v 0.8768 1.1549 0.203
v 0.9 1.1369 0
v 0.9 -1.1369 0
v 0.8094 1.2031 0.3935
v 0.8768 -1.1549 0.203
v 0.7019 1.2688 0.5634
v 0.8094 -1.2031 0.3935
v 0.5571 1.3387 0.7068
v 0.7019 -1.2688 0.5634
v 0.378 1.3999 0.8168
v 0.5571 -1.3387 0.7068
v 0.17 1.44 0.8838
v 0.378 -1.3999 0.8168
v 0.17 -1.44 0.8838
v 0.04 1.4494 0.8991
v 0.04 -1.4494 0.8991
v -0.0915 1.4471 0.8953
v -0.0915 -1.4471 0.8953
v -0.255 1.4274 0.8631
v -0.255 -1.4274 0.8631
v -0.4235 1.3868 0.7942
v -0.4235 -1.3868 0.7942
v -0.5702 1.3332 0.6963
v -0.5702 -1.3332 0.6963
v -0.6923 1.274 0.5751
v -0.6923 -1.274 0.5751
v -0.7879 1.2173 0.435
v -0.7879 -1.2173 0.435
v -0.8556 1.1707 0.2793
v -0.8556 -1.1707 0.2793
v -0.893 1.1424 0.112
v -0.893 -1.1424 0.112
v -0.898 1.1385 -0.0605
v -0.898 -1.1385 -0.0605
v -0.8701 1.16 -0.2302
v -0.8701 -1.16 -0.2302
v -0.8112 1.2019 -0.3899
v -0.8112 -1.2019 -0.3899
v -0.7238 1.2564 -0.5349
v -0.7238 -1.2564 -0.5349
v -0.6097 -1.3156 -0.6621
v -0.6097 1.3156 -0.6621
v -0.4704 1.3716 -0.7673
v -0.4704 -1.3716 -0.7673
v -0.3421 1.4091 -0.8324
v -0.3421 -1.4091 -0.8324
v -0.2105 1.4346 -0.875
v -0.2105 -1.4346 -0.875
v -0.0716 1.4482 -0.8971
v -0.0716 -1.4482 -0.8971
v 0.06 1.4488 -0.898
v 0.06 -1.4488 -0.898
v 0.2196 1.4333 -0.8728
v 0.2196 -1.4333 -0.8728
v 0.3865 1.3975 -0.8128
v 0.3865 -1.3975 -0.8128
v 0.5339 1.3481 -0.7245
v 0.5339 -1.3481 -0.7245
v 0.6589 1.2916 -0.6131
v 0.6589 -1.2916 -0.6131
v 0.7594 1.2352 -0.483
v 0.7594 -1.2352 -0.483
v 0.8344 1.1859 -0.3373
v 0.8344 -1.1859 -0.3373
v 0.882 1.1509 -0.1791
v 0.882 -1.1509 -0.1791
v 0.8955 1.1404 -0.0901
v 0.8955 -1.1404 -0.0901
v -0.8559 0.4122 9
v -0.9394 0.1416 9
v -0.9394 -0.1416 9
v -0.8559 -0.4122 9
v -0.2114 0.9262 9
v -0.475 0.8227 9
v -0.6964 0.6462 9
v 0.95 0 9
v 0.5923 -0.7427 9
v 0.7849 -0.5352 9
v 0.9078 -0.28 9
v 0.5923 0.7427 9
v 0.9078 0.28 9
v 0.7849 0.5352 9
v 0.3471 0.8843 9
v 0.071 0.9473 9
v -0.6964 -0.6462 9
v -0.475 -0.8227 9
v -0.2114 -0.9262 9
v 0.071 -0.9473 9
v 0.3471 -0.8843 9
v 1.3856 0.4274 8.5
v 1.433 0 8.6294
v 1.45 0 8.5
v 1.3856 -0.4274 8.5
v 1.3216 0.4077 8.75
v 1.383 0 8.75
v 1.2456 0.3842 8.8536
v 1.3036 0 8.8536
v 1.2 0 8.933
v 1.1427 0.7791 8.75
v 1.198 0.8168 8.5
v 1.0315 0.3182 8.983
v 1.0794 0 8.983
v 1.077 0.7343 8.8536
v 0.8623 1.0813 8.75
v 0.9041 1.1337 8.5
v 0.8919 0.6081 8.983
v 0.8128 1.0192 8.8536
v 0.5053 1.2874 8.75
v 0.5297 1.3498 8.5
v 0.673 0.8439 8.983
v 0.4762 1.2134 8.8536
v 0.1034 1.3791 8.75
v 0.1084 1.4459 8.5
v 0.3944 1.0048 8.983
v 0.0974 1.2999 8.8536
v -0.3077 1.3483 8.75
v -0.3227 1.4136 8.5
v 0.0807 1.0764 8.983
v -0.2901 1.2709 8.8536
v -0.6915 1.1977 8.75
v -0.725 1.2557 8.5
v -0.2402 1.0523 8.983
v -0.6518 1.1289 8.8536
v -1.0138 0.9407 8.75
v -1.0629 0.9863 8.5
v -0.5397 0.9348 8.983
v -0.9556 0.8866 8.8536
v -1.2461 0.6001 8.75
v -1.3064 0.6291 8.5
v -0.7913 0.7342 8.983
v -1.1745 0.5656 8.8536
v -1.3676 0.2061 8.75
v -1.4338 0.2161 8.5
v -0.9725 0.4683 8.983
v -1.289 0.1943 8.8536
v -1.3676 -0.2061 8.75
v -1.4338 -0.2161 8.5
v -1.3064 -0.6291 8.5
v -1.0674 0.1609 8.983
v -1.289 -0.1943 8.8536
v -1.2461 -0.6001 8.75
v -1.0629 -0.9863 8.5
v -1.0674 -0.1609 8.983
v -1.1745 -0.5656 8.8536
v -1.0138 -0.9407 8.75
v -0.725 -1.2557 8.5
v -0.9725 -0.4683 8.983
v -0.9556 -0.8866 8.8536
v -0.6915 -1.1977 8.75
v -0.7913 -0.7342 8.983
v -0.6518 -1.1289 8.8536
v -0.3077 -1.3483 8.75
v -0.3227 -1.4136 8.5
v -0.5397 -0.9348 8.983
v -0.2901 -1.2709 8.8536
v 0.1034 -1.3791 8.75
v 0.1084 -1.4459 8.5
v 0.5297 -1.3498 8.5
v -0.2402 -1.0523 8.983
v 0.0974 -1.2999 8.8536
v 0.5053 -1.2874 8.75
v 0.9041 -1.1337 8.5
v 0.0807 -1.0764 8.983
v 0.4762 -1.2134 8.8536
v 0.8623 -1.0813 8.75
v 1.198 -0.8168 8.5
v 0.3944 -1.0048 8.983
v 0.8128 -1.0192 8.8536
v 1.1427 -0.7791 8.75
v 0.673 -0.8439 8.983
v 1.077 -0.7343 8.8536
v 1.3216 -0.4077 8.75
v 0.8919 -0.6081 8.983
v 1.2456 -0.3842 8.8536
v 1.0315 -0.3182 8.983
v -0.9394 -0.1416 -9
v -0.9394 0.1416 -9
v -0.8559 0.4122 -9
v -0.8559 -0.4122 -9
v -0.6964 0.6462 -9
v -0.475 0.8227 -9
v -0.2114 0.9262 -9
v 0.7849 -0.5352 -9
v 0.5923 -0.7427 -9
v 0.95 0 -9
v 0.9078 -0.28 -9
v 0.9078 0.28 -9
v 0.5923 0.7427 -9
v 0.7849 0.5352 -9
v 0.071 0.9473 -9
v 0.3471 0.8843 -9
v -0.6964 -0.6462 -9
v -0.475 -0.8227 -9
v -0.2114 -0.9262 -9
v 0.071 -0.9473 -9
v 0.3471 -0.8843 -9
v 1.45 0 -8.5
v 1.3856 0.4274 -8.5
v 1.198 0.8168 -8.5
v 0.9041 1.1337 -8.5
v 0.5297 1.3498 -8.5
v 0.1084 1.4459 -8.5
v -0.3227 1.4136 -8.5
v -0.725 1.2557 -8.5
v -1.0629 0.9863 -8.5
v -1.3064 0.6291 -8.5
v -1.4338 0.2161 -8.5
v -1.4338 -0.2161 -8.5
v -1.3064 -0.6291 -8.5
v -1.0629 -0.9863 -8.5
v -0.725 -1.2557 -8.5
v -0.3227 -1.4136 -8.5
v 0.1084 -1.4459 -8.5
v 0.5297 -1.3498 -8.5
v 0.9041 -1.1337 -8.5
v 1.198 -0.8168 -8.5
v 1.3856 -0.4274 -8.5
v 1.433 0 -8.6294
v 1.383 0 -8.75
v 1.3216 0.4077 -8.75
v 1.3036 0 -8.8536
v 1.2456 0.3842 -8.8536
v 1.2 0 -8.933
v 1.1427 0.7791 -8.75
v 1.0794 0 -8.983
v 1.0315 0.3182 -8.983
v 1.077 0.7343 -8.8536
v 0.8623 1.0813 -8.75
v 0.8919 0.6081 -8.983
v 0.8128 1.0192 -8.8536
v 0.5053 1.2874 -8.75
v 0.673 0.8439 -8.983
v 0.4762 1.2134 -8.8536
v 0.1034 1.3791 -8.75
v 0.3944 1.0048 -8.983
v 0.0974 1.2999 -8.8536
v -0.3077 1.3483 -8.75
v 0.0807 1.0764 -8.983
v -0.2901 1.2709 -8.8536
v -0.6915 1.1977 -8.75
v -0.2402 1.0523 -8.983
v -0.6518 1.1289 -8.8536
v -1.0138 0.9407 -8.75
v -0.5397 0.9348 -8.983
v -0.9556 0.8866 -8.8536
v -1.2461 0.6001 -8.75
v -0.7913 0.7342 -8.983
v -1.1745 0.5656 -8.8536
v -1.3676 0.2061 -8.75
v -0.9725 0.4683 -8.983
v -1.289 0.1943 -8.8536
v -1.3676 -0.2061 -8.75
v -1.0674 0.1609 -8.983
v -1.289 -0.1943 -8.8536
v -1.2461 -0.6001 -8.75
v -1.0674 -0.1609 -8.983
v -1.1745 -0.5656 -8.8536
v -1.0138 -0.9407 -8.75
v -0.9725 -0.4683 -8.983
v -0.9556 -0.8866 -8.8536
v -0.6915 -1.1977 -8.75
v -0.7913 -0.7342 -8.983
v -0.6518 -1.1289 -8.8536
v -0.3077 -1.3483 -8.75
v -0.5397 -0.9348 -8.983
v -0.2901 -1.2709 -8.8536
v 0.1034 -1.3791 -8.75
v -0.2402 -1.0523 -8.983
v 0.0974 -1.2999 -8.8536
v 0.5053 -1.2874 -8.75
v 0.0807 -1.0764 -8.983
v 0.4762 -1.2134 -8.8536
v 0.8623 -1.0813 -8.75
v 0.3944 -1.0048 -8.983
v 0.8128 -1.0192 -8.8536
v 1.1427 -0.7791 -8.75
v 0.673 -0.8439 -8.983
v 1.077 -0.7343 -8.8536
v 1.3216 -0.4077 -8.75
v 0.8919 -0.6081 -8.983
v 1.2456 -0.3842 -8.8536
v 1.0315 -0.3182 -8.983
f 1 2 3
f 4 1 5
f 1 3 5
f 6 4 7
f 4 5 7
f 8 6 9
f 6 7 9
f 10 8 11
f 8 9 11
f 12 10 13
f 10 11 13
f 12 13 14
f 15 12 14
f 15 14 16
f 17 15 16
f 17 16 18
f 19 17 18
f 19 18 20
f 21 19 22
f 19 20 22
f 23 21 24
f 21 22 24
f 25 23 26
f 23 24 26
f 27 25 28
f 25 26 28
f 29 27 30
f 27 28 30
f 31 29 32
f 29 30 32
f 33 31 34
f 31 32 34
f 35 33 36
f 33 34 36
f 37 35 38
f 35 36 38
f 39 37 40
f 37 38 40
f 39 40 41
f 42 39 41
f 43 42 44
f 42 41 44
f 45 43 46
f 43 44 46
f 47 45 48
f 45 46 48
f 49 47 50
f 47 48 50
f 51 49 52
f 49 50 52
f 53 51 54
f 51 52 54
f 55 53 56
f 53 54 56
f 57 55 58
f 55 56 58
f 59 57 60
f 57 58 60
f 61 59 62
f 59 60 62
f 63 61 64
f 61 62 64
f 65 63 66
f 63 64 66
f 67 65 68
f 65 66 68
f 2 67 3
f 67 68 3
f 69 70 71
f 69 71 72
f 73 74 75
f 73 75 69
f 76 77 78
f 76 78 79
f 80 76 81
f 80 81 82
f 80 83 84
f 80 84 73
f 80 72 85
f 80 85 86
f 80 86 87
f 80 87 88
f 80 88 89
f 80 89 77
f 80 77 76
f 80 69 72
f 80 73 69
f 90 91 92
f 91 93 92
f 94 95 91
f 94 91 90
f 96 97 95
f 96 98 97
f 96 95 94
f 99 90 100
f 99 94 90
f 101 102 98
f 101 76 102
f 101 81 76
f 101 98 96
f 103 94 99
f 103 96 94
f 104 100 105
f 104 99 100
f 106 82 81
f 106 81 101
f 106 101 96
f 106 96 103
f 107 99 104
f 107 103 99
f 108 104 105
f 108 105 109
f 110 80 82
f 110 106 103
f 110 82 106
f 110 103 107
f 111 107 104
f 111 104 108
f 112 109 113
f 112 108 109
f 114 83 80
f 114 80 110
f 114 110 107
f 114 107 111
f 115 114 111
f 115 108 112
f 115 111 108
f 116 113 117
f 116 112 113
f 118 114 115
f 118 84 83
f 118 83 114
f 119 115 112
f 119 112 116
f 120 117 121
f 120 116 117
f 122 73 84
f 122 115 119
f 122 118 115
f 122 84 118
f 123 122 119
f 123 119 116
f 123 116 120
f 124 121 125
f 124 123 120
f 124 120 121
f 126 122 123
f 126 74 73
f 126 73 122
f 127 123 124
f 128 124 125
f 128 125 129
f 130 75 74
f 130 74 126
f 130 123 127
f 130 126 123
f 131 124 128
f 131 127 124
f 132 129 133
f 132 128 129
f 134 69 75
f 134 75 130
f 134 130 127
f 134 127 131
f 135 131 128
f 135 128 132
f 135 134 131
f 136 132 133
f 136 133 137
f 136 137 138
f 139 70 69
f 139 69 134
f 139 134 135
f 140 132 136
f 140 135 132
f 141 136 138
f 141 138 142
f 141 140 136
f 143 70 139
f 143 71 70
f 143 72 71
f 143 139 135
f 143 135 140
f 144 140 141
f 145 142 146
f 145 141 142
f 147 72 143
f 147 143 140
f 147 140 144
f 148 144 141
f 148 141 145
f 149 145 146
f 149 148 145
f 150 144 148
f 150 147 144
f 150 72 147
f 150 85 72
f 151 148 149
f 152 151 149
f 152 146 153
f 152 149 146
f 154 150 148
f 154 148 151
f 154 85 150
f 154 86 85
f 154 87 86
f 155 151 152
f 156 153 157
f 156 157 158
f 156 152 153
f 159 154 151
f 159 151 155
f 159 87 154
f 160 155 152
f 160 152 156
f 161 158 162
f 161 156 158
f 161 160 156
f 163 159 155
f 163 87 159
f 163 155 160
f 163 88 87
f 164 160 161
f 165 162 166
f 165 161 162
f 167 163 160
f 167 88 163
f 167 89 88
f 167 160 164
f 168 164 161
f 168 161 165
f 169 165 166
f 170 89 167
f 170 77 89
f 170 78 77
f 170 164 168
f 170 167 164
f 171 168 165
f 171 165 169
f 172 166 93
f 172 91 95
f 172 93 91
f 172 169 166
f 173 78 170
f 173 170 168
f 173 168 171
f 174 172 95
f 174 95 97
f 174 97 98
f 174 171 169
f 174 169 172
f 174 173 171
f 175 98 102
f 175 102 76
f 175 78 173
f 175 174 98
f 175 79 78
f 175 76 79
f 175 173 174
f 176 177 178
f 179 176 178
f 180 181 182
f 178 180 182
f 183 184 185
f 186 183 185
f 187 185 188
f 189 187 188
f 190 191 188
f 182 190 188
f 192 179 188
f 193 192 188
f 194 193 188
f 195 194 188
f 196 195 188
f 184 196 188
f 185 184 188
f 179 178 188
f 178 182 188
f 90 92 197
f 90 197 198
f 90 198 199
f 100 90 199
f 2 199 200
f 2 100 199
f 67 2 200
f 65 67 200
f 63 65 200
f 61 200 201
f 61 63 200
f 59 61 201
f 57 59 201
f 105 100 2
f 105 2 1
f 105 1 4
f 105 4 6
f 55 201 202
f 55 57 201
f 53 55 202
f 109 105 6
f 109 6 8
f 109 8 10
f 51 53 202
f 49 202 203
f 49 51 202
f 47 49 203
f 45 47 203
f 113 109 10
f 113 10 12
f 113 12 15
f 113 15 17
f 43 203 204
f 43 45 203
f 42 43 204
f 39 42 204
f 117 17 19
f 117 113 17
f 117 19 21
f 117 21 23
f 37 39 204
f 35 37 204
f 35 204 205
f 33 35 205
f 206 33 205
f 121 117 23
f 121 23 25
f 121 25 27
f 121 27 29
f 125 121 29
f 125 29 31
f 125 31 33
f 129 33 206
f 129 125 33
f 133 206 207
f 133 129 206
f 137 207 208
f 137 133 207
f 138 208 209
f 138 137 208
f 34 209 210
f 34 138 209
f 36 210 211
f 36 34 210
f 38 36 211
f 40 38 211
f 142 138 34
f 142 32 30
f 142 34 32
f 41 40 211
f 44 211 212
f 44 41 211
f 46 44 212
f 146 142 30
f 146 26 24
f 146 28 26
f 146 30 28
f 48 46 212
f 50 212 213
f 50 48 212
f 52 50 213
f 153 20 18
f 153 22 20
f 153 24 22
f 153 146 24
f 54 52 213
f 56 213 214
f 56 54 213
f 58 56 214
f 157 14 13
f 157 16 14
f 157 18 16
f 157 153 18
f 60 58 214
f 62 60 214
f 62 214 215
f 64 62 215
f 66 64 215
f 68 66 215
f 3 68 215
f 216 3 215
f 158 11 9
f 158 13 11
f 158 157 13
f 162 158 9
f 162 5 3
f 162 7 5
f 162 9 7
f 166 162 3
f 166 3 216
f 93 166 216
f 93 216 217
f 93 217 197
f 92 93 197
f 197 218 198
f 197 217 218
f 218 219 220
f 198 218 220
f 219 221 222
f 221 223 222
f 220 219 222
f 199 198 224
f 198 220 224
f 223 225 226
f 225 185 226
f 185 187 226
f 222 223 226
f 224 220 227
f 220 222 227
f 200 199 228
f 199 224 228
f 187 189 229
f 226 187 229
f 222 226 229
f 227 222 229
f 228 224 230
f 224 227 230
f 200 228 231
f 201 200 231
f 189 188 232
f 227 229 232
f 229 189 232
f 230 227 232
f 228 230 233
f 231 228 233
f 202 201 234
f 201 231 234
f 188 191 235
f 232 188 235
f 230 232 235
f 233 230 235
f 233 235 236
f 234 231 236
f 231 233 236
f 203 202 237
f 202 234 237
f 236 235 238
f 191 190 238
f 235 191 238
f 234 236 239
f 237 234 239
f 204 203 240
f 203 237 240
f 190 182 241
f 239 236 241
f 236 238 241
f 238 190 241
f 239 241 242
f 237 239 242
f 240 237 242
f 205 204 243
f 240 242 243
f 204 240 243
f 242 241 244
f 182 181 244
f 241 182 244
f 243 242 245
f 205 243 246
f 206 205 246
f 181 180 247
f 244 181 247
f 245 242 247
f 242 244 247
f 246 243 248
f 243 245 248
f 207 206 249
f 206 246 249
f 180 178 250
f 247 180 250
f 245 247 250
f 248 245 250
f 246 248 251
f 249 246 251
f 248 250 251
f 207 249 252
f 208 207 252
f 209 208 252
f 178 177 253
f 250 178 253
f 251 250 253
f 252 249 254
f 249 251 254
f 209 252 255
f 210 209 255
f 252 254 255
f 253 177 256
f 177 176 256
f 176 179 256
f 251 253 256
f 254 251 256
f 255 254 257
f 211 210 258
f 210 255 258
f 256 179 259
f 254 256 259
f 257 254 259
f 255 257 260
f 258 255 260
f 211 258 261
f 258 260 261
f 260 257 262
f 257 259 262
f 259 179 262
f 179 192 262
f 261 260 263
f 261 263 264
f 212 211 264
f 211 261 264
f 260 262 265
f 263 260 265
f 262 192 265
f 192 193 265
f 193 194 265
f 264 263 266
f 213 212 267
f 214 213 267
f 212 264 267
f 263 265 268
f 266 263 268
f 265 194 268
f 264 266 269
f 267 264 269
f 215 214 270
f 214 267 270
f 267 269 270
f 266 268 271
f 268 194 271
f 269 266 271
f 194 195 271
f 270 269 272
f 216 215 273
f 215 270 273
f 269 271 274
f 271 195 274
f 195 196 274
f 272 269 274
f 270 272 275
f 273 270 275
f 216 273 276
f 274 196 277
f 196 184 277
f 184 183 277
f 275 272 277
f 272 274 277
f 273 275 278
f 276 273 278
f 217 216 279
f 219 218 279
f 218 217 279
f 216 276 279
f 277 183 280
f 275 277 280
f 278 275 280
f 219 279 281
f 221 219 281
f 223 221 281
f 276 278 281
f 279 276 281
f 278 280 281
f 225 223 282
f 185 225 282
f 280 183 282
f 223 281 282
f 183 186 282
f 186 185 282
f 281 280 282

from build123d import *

# Parameters (mm, degrees)
F0_R     = 1.45
F1_DEPTH = 9
F2_R     = 0.9
F3_DEPTH = 12.5
F4_R     = 0.5


with BuildPart() as f1:
    # F0 (on Top) → F1 (new body, symmetric)
    with BuildSketch(Plane.XY):
        Circle(F0_R)
    extrude(amount=F1_DEPTH, both=True)

    # F2 (on Front) → F3 (cut, symmetric)
    with BuildSketch(Plane.XZ):
        Circle(F2_R)
    extrude(amount=F3_DEPTH, both=True, mode=Mode.SUBTRACT)

    # F4
    f4_edges = [f1.edges().sort_by_distance(p)[0] for p in [
        (-1.45, 0, 9),
        (-1.45, 0, -9),
    ]]
    fillet(f4_edges, radius=F4_R)


solid = f1.part
